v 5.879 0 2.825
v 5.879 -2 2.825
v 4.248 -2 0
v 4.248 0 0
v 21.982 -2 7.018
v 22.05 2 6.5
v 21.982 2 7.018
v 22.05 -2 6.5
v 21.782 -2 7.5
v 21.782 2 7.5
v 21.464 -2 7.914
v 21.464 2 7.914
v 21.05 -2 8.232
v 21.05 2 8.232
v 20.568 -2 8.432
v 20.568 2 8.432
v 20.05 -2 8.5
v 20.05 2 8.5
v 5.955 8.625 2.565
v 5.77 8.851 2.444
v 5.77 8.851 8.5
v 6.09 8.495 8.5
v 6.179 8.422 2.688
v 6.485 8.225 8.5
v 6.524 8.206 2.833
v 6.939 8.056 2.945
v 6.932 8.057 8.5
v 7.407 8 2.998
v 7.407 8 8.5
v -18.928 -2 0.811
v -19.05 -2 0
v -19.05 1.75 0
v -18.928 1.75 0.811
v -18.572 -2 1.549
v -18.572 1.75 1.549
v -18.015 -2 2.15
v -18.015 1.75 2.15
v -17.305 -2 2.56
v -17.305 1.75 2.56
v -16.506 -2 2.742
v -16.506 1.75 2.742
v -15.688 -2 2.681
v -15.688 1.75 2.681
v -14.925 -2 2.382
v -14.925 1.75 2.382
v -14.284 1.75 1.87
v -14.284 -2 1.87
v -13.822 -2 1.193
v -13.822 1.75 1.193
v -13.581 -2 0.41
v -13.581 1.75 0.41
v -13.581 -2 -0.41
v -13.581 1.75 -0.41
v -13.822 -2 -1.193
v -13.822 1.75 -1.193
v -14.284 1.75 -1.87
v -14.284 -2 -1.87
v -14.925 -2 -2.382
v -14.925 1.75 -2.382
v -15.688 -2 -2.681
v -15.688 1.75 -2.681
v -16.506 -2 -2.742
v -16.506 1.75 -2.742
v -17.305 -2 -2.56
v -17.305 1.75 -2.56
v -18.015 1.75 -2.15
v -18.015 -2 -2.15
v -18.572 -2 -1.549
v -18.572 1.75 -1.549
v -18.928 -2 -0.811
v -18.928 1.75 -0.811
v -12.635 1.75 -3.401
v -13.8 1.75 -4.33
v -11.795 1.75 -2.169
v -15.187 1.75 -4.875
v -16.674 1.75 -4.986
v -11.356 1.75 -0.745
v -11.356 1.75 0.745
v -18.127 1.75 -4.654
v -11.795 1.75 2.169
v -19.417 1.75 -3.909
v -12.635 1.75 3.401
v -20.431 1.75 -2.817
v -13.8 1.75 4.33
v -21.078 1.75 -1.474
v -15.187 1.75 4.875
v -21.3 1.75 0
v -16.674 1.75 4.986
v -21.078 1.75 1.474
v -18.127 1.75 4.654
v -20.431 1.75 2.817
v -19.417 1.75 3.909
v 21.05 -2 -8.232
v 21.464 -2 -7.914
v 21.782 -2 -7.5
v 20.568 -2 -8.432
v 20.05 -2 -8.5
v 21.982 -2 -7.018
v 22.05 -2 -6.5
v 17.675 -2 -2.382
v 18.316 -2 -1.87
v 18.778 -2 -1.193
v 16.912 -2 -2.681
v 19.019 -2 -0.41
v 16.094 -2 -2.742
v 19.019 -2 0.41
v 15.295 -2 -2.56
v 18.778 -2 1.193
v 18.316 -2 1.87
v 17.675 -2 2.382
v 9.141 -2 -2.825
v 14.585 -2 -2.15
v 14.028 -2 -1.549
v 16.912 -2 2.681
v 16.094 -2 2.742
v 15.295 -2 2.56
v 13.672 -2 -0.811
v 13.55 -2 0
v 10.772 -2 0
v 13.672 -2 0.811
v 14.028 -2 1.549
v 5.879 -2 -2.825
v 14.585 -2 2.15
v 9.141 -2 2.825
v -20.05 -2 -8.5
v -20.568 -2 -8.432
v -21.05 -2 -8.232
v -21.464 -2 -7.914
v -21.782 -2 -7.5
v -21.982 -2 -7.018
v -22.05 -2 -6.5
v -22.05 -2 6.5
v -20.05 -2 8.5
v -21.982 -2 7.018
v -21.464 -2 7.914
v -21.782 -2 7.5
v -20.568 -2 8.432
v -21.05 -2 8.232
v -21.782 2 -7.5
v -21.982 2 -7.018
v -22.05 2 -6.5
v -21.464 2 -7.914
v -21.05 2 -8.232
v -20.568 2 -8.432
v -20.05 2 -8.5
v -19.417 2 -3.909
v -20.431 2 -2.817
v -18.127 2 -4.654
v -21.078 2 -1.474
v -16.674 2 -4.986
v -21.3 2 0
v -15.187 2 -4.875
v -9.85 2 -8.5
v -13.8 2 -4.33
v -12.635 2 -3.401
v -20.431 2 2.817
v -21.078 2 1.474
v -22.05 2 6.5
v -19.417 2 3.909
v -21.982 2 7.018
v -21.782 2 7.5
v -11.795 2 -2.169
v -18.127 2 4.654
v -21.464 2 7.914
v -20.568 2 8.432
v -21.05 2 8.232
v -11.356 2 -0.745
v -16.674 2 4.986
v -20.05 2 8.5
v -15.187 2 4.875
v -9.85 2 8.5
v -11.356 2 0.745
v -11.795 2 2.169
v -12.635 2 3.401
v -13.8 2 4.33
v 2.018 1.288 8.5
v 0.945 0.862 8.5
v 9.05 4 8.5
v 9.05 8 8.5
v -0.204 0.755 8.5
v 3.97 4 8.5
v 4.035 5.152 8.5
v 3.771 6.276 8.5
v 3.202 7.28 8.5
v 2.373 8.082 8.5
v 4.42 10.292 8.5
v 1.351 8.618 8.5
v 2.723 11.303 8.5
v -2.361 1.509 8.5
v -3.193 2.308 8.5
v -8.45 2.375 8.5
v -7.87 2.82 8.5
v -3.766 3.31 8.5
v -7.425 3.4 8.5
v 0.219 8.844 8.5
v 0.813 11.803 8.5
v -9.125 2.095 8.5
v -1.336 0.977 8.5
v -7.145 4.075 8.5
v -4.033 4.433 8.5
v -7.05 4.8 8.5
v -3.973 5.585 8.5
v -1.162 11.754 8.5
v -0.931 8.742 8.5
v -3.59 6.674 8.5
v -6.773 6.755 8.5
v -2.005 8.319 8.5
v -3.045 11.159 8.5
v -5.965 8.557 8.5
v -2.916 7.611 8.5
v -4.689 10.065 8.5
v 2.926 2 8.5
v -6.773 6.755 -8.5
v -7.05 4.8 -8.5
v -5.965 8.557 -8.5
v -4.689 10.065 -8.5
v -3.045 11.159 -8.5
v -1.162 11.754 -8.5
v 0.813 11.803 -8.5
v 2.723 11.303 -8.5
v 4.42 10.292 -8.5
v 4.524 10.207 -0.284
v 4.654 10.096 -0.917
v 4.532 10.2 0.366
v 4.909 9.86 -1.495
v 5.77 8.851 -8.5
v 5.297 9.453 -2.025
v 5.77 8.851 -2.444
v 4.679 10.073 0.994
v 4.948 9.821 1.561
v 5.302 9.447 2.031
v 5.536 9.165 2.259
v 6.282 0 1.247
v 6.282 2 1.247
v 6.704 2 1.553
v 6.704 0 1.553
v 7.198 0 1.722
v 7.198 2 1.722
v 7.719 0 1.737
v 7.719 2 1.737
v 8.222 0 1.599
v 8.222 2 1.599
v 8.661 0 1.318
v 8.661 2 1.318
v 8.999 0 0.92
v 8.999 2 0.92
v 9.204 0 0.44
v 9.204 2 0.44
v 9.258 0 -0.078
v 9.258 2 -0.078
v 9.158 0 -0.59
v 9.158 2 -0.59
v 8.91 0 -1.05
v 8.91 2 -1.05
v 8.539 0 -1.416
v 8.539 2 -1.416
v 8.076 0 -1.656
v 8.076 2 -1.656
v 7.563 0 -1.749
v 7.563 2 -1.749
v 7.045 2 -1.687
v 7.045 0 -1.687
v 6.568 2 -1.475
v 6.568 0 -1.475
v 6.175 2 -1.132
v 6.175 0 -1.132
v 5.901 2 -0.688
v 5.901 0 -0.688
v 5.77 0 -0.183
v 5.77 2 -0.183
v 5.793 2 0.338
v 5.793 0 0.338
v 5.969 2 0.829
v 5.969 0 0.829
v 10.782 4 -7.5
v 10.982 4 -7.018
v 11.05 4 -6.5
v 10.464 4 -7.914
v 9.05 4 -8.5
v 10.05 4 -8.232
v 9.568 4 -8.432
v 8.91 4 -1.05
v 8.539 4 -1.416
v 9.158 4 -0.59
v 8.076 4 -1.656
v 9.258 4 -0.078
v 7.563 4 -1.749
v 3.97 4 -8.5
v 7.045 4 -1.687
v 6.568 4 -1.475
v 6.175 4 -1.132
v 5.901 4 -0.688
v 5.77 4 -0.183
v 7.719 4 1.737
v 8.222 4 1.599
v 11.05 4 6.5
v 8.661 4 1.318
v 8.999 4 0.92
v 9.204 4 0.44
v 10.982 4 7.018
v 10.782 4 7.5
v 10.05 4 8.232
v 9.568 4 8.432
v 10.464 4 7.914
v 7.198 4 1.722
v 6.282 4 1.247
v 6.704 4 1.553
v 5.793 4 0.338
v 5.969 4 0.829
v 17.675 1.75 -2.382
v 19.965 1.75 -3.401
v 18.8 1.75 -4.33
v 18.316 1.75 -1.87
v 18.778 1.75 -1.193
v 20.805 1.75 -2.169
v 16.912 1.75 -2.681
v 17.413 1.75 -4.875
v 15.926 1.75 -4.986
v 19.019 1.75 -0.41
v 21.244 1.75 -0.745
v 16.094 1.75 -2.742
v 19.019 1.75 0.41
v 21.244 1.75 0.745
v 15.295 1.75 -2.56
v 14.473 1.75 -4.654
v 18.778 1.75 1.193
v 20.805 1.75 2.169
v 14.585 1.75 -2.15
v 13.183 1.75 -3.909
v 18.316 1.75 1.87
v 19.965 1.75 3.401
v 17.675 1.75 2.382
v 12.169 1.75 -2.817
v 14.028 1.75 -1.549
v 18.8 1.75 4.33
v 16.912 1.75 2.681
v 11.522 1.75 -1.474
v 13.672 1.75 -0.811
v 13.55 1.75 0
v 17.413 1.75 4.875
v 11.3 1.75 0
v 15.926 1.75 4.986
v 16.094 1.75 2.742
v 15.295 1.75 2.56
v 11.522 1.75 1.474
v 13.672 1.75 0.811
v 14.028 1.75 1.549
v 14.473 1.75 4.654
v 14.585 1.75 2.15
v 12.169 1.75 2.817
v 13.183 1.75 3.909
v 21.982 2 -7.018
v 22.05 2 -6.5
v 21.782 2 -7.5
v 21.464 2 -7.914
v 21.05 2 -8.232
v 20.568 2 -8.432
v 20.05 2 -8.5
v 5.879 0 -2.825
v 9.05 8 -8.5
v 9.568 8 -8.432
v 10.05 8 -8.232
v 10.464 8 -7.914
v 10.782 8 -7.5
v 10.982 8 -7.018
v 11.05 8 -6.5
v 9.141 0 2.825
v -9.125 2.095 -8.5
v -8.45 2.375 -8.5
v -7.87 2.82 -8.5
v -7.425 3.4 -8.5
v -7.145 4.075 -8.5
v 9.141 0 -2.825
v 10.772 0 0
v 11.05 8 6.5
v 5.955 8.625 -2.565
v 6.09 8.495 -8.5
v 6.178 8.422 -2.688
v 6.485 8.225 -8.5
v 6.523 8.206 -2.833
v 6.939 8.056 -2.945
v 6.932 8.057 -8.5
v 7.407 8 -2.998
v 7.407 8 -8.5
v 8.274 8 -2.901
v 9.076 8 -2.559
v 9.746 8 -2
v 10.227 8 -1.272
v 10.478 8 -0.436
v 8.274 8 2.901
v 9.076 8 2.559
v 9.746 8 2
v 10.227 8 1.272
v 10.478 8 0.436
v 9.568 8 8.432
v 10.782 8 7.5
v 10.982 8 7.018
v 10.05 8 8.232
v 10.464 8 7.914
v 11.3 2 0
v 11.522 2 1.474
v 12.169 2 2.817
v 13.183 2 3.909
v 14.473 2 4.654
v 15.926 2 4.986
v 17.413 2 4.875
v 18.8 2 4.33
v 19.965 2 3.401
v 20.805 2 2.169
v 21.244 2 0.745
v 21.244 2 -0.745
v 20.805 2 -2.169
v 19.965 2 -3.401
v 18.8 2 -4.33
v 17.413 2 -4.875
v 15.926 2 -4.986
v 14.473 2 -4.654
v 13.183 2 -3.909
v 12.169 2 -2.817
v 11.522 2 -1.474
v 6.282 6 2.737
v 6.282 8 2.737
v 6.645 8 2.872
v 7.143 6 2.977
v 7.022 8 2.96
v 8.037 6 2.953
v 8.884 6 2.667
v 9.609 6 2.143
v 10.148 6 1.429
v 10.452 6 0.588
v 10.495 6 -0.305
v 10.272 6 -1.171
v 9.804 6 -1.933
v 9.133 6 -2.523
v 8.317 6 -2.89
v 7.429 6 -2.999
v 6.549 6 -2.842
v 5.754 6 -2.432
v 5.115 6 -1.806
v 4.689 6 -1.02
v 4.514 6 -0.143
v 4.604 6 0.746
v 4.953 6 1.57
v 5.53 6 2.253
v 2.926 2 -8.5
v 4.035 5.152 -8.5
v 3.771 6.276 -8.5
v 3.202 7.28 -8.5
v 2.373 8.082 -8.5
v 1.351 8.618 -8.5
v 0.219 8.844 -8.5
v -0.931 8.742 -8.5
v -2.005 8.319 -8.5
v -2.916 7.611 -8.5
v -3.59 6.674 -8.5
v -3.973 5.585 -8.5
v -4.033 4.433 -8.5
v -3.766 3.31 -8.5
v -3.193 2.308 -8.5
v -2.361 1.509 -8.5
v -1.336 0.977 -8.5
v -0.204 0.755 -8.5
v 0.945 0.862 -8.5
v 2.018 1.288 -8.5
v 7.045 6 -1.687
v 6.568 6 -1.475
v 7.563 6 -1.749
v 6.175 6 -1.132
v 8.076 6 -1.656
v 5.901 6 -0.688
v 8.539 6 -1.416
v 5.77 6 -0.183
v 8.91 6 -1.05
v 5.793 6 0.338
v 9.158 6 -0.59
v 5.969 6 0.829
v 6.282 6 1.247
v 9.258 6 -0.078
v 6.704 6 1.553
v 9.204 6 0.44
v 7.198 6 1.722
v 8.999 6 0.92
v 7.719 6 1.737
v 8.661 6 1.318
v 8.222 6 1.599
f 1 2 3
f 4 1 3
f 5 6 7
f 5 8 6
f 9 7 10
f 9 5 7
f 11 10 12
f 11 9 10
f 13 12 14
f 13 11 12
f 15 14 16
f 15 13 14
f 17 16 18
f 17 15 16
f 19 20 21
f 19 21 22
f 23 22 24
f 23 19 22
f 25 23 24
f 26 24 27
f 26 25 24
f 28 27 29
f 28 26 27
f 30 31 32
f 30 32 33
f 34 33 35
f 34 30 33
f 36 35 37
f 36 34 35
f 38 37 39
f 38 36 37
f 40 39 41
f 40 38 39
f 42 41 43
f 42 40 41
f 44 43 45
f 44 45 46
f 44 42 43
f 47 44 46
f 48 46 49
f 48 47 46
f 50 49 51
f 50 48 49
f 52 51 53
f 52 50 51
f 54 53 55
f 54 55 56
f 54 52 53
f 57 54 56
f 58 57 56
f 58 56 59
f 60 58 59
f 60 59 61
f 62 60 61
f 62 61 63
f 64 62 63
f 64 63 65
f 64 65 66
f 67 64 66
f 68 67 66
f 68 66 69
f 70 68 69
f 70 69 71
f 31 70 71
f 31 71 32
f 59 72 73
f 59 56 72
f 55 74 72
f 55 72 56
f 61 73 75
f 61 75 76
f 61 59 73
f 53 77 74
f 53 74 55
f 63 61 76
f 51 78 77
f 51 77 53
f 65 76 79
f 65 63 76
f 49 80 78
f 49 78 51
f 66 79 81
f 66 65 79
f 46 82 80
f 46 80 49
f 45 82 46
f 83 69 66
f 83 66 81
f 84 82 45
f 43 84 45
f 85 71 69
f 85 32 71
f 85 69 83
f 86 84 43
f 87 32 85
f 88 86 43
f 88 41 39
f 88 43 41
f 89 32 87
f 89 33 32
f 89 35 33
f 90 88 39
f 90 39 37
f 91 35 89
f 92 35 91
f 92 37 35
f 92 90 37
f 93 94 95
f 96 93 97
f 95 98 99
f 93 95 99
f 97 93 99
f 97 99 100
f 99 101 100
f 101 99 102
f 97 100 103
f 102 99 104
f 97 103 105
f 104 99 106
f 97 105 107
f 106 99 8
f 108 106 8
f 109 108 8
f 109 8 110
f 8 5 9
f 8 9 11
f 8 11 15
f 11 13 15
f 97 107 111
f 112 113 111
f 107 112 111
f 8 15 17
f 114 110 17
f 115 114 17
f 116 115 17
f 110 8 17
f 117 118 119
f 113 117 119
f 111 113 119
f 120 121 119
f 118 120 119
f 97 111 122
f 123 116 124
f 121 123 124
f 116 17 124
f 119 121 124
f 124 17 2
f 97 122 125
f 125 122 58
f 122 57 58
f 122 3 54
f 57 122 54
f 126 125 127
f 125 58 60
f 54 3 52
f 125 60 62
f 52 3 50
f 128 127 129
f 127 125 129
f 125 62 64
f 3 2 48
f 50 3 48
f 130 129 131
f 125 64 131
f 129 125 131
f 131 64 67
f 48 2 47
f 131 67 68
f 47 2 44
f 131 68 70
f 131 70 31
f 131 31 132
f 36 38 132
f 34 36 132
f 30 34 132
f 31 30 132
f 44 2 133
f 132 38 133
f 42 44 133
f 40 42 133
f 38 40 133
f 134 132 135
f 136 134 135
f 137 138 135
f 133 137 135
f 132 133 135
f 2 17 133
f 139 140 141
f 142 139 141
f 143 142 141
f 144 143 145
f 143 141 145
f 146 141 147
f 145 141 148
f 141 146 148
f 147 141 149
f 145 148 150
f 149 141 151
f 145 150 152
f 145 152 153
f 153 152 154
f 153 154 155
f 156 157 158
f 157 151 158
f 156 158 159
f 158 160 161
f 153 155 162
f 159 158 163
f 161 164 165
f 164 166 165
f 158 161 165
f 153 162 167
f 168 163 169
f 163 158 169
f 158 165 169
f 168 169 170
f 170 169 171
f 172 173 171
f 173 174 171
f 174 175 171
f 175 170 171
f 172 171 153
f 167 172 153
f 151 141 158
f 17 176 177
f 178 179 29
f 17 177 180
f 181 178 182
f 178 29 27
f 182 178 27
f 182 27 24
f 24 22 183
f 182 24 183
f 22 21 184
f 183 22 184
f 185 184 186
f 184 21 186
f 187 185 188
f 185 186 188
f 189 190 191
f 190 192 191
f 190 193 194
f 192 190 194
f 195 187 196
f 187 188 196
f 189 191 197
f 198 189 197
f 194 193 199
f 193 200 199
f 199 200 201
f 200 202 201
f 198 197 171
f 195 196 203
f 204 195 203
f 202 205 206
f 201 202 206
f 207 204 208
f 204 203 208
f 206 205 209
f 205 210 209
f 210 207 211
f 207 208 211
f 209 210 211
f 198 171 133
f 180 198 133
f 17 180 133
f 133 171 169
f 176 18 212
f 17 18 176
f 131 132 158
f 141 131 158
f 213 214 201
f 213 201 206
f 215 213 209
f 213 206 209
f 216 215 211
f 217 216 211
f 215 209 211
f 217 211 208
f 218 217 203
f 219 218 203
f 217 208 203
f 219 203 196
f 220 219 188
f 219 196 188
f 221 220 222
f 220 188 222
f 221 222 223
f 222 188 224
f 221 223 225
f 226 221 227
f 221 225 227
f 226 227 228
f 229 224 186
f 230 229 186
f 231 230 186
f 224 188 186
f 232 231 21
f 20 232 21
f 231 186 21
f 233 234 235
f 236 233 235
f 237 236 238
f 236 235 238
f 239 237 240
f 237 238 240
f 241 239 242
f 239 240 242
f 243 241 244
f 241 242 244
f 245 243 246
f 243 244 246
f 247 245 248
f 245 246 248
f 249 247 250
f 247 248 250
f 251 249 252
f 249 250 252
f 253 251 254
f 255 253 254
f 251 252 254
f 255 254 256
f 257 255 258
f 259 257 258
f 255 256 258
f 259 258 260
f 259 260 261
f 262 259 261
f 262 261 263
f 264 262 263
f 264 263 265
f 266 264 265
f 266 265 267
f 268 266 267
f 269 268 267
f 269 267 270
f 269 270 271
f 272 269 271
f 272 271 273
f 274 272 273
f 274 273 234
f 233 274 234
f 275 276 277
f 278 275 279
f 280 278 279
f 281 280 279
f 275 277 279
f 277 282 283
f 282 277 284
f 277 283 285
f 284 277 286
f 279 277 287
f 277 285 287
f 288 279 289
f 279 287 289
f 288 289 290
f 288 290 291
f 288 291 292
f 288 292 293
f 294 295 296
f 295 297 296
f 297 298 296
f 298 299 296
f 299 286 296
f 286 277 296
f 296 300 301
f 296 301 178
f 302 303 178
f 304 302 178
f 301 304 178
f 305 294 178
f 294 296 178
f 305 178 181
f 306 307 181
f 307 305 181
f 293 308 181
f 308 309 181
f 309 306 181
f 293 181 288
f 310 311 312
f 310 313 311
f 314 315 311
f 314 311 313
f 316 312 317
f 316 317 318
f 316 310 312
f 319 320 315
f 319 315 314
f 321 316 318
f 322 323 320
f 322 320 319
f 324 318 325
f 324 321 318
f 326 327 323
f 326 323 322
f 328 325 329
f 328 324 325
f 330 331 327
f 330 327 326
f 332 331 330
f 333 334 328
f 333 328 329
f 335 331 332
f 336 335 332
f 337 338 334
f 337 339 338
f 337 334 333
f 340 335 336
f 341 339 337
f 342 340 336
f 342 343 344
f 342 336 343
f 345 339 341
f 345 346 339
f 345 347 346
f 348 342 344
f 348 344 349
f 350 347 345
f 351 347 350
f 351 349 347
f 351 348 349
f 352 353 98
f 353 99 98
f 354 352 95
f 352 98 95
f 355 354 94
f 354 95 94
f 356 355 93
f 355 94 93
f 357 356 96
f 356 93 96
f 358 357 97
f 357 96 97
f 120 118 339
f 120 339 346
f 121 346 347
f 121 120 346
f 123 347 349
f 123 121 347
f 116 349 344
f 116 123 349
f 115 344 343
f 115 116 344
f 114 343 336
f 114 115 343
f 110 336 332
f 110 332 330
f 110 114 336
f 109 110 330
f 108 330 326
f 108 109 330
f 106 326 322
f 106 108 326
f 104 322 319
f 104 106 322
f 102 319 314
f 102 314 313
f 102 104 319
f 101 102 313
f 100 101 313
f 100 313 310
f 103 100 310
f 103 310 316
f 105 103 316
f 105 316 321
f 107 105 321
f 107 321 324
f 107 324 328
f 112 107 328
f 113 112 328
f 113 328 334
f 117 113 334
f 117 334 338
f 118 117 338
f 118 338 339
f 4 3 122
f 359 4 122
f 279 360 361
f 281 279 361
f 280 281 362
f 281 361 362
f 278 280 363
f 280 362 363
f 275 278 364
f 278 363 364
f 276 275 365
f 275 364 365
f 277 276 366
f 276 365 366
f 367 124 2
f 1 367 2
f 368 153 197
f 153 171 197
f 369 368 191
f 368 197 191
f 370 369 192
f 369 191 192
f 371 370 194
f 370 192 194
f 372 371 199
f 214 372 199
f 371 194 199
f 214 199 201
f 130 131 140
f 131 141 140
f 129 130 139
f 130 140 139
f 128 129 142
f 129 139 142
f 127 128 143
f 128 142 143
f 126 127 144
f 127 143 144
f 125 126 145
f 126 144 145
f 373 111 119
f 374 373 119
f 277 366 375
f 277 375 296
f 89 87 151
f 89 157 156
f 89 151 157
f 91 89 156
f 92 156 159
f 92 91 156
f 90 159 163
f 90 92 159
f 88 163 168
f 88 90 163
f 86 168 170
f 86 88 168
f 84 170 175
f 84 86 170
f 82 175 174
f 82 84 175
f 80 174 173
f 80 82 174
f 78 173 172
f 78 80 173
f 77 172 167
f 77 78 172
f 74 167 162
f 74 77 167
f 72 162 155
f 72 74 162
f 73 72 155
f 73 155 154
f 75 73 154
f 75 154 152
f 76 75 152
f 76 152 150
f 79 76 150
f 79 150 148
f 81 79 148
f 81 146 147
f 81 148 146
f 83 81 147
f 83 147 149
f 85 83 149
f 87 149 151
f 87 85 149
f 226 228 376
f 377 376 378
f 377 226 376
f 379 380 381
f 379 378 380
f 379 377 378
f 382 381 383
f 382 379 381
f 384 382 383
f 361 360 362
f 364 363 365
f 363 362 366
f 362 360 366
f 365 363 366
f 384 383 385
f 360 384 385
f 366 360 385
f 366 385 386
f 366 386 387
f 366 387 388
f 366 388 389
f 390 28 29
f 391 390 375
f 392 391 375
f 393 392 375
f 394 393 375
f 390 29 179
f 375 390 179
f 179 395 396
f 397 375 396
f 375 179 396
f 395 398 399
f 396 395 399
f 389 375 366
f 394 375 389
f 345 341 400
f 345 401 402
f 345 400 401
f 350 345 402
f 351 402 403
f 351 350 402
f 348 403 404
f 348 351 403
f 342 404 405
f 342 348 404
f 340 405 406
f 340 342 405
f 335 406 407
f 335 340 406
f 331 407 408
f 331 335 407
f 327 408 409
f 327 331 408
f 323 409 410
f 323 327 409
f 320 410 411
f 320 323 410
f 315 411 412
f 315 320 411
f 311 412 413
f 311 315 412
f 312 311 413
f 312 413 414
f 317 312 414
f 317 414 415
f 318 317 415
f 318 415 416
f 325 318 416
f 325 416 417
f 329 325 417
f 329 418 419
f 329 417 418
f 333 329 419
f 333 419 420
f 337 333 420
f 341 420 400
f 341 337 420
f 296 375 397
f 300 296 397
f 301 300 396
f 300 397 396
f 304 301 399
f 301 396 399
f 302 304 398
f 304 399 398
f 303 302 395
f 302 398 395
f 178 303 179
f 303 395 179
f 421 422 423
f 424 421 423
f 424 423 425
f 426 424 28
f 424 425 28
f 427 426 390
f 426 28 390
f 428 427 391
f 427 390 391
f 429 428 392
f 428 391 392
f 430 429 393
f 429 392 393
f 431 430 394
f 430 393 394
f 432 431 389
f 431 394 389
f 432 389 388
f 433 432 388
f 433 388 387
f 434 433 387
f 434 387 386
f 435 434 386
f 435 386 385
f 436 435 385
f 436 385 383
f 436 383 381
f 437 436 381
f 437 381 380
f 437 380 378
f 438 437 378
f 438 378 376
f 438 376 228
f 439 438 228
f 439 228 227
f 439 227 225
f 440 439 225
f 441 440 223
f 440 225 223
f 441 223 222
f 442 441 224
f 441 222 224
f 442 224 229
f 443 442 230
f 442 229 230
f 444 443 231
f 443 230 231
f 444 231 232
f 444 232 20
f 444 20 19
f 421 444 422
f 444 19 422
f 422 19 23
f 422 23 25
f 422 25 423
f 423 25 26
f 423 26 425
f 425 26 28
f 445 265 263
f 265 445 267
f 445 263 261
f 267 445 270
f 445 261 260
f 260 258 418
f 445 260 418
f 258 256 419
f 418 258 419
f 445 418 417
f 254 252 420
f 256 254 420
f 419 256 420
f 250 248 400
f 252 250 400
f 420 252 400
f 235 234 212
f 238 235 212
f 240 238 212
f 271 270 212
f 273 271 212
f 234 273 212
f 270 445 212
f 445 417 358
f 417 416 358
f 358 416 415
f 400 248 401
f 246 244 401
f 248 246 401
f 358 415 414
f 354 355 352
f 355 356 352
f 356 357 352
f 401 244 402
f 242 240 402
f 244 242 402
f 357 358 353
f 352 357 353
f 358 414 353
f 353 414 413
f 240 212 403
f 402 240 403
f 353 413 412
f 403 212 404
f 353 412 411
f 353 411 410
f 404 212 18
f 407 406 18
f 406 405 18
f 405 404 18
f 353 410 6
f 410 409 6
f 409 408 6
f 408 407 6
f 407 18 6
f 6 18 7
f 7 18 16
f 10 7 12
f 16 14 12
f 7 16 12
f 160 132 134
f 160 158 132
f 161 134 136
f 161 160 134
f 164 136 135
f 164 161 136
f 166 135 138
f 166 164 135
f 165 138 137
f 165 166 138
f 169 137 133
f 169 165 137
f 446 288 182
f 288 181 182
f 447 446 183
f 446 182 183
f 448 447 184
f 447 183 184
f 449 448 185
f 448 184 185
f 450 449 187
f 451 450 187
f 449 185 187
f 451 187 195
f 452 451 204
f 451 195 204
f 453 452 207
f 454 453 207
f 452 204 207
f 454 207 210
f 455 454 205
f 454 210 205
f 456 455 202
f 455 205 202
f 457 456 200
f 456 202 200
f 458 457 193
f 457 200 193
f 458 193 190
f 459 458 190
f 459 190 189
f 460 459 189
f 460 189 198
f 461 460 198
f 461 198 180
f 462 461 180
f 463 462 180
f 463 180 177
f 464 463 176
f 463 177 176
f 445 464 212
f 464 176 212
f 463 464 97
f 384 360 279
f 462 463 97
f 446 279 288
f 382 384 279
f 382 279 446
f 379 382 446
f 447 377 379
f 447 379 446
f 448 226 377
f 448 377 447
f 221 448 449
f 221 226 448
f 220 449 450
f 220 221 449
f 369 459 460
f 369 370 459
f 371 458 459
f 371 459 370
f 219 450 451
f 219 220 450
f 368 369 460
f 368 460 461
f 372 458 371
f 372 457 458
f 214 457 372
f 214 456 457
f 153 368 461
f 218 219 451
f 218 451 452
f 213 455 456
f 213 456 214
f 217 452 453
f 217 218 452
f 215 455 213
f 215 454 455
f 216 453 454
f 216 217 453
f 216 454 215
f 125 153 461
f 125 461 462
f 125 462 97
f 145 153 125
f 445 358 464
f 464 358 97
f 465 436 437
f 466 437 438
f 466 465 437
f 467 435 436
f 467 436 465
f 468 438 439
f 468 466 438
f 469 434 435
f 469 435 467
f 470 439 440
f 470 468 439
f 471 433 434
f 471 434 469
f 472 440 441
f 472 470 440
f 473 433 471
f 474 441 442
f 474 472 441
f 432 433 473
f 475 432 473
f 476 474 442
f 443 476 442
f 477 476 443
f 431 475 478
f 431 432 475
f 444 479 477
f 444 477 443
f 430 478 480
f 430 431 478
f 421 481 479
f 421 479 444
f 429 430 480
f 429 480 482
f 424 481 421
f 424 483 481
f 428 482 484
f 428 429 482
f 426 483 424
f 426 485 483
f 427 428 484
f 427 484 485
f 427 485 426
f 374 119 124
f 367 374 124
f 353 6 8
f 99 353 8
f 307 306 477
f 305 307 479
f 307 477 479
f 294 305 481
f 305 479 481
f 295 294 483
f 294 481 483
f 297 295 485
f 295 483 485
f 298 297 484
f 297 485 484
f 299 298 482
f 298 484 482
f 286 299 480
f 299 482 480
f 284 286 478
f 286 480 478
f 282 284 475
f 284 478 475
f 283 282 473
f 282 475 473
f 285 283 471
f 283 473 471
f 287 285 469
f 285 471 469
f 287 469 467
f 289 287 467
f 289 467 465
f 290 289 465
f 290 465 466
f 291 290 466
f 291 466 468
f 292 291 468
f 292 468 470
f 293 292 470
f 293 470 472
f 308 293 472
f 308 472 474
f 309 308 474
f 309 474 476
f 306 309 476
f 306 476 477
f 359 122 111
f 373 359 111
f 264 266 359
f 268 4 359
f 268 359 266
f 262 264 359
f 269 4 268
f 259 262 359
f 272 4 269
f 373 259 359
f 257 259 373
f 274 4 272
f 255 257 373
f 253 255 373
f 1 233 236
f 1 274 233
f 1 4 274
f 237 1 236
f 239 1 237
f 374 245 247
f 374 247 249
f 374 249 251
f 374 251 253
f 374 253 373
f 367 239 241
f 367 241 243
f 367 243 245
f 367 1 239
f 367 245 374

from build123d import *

# Parameters (mm, degrees)
BOSS_EXTRUDE1_DEPTH     = 8.5
CUT_EXTRUDE1_DEPTH      = 2
CUT_EXTRUDE1_DEPTH_BACK = 26.602245995
SKETCH2_R               = 2.75
CUT_EXTRUDE2_DEPTH      = 2
CUT_EXTRUDE2_DEPTH_BACK = 0.25
SKETCH2_3_R             = 5
SKETCH2_3_R_2           = 2.75
SKETCH3_R               = 1.75
CUT_EXTRUDE3_DEPTH      = 28.391148205
SKETCH3_3_R             = 3
SKETCH3_3_R_2           = 1.75
CUT_EXTRUDE4_DEPTH      = 5.85
FILLET1_R               = 2
FILLET2_R               = 2
CUT_EXTRUDE5_DEPTH      = 2


with BuildPart() as part:
    # Sketch1 → Boss-Extrude1 (new, symmetric)
    with BuildSketch(Plane.XY):
        with BuildLine():
            Line((11.05, 4), (3.970201506, 4))
            ThreePointArc((3.970201506, 4), (-3.590264914, 6.674165907), (2.926174978, 2))
            Line((2.926174978, 2), (22.05, 2))
            Line((22.05, 2), (22.05, -2))
            Line((22.05, -2), (-22.05, -2))
            Line((-22.05, -2), (-22.05, 2))
            Line((-22.05, 2), (-9.85, 2))
            ThreePointArc((-9.85, 2), (-7.870101013, 2.820101013), (-7.05, 4.8))
            ThreePointArc((-7.05, 4.8), (-1.645444408, 11.655290855), (6.281918497, 8))
            Line((6.281918497, 8), (11.05, 8))
            Line((11.05, 8), (11.05, 4))
        make_face()
    extrude(amount=BOSS_EXTRUDE1_DEPTH, both=True)

    # Sketch2 → Cut-Extrude1 (cut, two sides: drawn at the far end of the back side and taken through both)
    with BuildSketch(Plane(origin=(0, 2, 0), x_dir=(1, 0, 0), z_dir=(0, 1, 0)).offset(-CUT_EXTRUDE1_DEPTH_BACK)):
        with Locations(Location((16.3, 0, 0), (0, 0, 180))):
            Circle(SKETCH2_R)
        with Locations(Location((-16.3, 0, 0), (0, 0, 180))):
            Circle(SKETCH2_R)
    extrude(amount=CUT_EXTRUDE1_DEPTH + CUT_EXTRUDE1_DEPTH_BACK, mode=Mode.SUBTRACT)

    # Sketch2<3> → Cut-Extrude2 (cut, two sides: drawn at the far end of the back side and taken through both)
    # profile 1 of 2: a face of its own
    with BuildSketch(Plane(origin=(0, 2, 0), x_dir=(1, 0, 0), z_dir=(0, 1, 0)).offset(-CUT_EXTRUDE2_DEPTH_BACK)):
        with Locations(Location((16.3, 0, 0), (0, 0, 180))):
            Circle(SKETCH2_3_R)
        with Locations(Location((16.3, 0, 0), (0, 0, 180))):
            Circle(SKETCH2_3_R_2, mode=Mode.SUBTRACT)
    # profile 2 of 2: a face of its own
    with BuildSketch(Plane(origin=(0, 2, 0), x_dir=(1, 0, 0), z_dir=(0, 1, 0)).offset(-CUT_EXTRUDE2_DEPTH_BACK)):
        with Locations(Location((-16.3, 0, 0), (0, 0, 180))):
            Circle(SKETCH2_3_R)
        with Locations(Location((-16.3, 0, 0), (0, 0, 180))):
            Circle(SKETCH2_3_R_2, mode=Mode.SUBTRACT)
    extrude(amount=CUT_EXTRUDE2_DEPTH + CUT_EXTRUDE2_DEPTH_BACK, mode=Mode.SUBTRACT)

    # Sketch3 → Cut-Extrude3 (cut, through all)
    with BuildSketch(Plane(origin=(0, 11.85, 0), x_dir=(1, 0, 0), z_dir=(0, 1, 0))):
        with Locations(Location((7.510100753, 0, 0), (0, 0, 225.426920251))):
            Circle(SKETCH3_R)
    extrude(amount=-CUT_EXTRUDE3_DEPTH, mode=Mode.SUBTRACT)

    # Sketch3<3> → Cut-Extrude4 (cut)
    # profile 1 of 2: a face of its own
    with BuildSketch(Plane(origin=(0, 11.85, 0), x_dir=(1, 0, 0), z_dir=(0, 1, 0))):
        with Locations(Location((7.510100753, 0, 0), (0, 0, 245.83322212))):
            Circle(SKETCH3_3_R)
        with Locations(Location((7.510100753, 0, 0), (0, 0, 180))):
            Circle(SKETCH3_3_R_2, mode=Mode.SUBTRACT)
    # profile 2 of 2: a face of its own
    with BuildSketch(Plane(origin=(0, 11.85, 0), x_dir=(1, 0, 0), z_dir=(0, 1, 0))):
        with Locations(Location((7.510100753, 0, 0), (0, 0, 180))):
            Circle(SKETCH3_3_R_2)
    extrude(amount=-CUT_EXTRUDE4_DEPTH, mode=Mode.SUBTRACT)

    # Fillet1
    fillet1_edges = [part.edges().sort_by_distance(p)[0] for p in [
        (22.05, 0, 8.5),
        (22.05, 0, -8.5),
        (-22.05, 0, -8.5),
        (-22.05, 0, 8.5),
    ]]
    fillet(fillet1_edges, radius=FILLET1_R)

    # Fillet2
    # the kernel refuses this fillet: 2 mm, written as the material it adds along each edge
    with BuildSketch(Plane(origin=(6.281918497, 8, -0.075436901), x_dir=(1, 0, 0), z_dir=(0, 0, 1))) as fillet2_piece_1_section:
        with BuildLine():
            CenterArc((1.125003941, 2), FILLET2_R, 215.07061915, 54.92938085)
            ThreePointArc((-0.511884995, 0.850828729), (-0.240944724, 0.434437491), (0, 0))
            Line((0, 0), (1.125003941, 0))
        make_face()
    fillet2_piece_1 = extrude(amount=8.575436901, mode=Mode.PRIVATE)
    fillet2_piece_1 = fillet2_piece_1 - Plane(origin=(7.510100753, 8.184515376, 0), x_dir=(-0.4093940854484991, 0, 0.9123576507049125), z_dir=(0, 1, 0)) * Cylinder(3, 22, mode=Mode.PRIVATE)
    add(fillet2_piece_1)
    with BuildSketch(Plane(origin=(6.281918497, 8, -8.5), x_dir=(1, 0, 0), z_dir=(0, 0, 1))) as fillet2_piece_2_section:
        with BuildLine():
            CenterArc((1.125003941, 2), FILLET2_R, 215.07061915, 54.92938085)
            ThreePointArc((-0.511884995, 0.850828729), (-0.240944724, 0.434437491), (0, 0))
            Line((0, 0), (1.125003941, 0))
        make_face()
    fillet2_piece_2 = extrude(amount=8.575436901, mode=Mode.PRIVATE)
    fillet2_piece_2 = fillet2_piece_2 - Plane(origin=(7.510100753, 8.184515325, 0), x_dir=(-0.4093940854484991, 0, 0.9123576507049125), z_dir=(0, 1, 0)) * Cylinder(3, 22, mode=Mode.PRIVATE)
    add(fillet2_piece_2)
    # the kernel refuses this fillet: 2 mm, written as the material it takes off along each edge
    with BuildSketch(Plane(origin=(11.05, 13, -8.5), x_dir=(-1, 0, 0), z_dir=(0, -1, 0))) as fillet2_2_piece_1_section:
        with BuildLine():
            CenterArc((FILLET2_R, -FILLET2_R), FILLET2_R, 90, 90)
            Line((0, -FILLET2_R), (0, 0))
            Line((0, 0), (FILLET2_R, 0))
        make_face()
    fillet2_2_piece_1 = extrude(amount=14, mode=Mode.PRIVATE)
    fillet2_2_piece_1 = split(fillet2_2_piece_1, bisect_by=Plane(origin=(10.603264122, 2, -8.053264122), z_dir=(0, 1, 0)), keep=Keep.TOP, mode=Mode.PRIVATE)
    add(fillet2_2_piece_1, mode=Mode.SUBTRACT)
    with BuildSketch(Plane(origin=(11.05, 13, 8.5), x_dir=(-1, 0, 0), z_dir=(0, -1, 0))) as fillet2_2_piece_2_section:
        with BuildLine():
            CenterArc((FILLET2_R, FILLET2_R), FILLET2_R, 180, 90)
            Line((0, FILLET2_R), (0, 0))
            Line((0, 0), (FILLET2_R, 0))
        make_face()
    fillet2_2_piece_2 = extrude(amount=14, mode=Mode.PRIVATE)
    fillet2_2_piece_2 = split(fillet2_2_piece_2, bisect_by=Plane(origin=(10.603264122, 2, 8.053264122), z_dir=(0, 1, 0)), keep=Keep.TOP, mode=Mode.PRIVATE)
    add(fillet2_2_piece_2, mode=Mode.SUBTRACT)

    # Sketch4 → Cut-Extrude5 (cut)
    with BuildSketch(Plane.XZ.offset(2)):
        Polygon((10.772129774, 0), (9.141115264, 2.825), (5.879086243, 2.825), (4.248071732, 0), (5.879086243, -2.825), (9.141115264, -2.825), align=None)
    extrude(amount=-CUT_EXTRUDE5_DEPTH, mode=Mode.SUBTRACT)


solid = part.part
